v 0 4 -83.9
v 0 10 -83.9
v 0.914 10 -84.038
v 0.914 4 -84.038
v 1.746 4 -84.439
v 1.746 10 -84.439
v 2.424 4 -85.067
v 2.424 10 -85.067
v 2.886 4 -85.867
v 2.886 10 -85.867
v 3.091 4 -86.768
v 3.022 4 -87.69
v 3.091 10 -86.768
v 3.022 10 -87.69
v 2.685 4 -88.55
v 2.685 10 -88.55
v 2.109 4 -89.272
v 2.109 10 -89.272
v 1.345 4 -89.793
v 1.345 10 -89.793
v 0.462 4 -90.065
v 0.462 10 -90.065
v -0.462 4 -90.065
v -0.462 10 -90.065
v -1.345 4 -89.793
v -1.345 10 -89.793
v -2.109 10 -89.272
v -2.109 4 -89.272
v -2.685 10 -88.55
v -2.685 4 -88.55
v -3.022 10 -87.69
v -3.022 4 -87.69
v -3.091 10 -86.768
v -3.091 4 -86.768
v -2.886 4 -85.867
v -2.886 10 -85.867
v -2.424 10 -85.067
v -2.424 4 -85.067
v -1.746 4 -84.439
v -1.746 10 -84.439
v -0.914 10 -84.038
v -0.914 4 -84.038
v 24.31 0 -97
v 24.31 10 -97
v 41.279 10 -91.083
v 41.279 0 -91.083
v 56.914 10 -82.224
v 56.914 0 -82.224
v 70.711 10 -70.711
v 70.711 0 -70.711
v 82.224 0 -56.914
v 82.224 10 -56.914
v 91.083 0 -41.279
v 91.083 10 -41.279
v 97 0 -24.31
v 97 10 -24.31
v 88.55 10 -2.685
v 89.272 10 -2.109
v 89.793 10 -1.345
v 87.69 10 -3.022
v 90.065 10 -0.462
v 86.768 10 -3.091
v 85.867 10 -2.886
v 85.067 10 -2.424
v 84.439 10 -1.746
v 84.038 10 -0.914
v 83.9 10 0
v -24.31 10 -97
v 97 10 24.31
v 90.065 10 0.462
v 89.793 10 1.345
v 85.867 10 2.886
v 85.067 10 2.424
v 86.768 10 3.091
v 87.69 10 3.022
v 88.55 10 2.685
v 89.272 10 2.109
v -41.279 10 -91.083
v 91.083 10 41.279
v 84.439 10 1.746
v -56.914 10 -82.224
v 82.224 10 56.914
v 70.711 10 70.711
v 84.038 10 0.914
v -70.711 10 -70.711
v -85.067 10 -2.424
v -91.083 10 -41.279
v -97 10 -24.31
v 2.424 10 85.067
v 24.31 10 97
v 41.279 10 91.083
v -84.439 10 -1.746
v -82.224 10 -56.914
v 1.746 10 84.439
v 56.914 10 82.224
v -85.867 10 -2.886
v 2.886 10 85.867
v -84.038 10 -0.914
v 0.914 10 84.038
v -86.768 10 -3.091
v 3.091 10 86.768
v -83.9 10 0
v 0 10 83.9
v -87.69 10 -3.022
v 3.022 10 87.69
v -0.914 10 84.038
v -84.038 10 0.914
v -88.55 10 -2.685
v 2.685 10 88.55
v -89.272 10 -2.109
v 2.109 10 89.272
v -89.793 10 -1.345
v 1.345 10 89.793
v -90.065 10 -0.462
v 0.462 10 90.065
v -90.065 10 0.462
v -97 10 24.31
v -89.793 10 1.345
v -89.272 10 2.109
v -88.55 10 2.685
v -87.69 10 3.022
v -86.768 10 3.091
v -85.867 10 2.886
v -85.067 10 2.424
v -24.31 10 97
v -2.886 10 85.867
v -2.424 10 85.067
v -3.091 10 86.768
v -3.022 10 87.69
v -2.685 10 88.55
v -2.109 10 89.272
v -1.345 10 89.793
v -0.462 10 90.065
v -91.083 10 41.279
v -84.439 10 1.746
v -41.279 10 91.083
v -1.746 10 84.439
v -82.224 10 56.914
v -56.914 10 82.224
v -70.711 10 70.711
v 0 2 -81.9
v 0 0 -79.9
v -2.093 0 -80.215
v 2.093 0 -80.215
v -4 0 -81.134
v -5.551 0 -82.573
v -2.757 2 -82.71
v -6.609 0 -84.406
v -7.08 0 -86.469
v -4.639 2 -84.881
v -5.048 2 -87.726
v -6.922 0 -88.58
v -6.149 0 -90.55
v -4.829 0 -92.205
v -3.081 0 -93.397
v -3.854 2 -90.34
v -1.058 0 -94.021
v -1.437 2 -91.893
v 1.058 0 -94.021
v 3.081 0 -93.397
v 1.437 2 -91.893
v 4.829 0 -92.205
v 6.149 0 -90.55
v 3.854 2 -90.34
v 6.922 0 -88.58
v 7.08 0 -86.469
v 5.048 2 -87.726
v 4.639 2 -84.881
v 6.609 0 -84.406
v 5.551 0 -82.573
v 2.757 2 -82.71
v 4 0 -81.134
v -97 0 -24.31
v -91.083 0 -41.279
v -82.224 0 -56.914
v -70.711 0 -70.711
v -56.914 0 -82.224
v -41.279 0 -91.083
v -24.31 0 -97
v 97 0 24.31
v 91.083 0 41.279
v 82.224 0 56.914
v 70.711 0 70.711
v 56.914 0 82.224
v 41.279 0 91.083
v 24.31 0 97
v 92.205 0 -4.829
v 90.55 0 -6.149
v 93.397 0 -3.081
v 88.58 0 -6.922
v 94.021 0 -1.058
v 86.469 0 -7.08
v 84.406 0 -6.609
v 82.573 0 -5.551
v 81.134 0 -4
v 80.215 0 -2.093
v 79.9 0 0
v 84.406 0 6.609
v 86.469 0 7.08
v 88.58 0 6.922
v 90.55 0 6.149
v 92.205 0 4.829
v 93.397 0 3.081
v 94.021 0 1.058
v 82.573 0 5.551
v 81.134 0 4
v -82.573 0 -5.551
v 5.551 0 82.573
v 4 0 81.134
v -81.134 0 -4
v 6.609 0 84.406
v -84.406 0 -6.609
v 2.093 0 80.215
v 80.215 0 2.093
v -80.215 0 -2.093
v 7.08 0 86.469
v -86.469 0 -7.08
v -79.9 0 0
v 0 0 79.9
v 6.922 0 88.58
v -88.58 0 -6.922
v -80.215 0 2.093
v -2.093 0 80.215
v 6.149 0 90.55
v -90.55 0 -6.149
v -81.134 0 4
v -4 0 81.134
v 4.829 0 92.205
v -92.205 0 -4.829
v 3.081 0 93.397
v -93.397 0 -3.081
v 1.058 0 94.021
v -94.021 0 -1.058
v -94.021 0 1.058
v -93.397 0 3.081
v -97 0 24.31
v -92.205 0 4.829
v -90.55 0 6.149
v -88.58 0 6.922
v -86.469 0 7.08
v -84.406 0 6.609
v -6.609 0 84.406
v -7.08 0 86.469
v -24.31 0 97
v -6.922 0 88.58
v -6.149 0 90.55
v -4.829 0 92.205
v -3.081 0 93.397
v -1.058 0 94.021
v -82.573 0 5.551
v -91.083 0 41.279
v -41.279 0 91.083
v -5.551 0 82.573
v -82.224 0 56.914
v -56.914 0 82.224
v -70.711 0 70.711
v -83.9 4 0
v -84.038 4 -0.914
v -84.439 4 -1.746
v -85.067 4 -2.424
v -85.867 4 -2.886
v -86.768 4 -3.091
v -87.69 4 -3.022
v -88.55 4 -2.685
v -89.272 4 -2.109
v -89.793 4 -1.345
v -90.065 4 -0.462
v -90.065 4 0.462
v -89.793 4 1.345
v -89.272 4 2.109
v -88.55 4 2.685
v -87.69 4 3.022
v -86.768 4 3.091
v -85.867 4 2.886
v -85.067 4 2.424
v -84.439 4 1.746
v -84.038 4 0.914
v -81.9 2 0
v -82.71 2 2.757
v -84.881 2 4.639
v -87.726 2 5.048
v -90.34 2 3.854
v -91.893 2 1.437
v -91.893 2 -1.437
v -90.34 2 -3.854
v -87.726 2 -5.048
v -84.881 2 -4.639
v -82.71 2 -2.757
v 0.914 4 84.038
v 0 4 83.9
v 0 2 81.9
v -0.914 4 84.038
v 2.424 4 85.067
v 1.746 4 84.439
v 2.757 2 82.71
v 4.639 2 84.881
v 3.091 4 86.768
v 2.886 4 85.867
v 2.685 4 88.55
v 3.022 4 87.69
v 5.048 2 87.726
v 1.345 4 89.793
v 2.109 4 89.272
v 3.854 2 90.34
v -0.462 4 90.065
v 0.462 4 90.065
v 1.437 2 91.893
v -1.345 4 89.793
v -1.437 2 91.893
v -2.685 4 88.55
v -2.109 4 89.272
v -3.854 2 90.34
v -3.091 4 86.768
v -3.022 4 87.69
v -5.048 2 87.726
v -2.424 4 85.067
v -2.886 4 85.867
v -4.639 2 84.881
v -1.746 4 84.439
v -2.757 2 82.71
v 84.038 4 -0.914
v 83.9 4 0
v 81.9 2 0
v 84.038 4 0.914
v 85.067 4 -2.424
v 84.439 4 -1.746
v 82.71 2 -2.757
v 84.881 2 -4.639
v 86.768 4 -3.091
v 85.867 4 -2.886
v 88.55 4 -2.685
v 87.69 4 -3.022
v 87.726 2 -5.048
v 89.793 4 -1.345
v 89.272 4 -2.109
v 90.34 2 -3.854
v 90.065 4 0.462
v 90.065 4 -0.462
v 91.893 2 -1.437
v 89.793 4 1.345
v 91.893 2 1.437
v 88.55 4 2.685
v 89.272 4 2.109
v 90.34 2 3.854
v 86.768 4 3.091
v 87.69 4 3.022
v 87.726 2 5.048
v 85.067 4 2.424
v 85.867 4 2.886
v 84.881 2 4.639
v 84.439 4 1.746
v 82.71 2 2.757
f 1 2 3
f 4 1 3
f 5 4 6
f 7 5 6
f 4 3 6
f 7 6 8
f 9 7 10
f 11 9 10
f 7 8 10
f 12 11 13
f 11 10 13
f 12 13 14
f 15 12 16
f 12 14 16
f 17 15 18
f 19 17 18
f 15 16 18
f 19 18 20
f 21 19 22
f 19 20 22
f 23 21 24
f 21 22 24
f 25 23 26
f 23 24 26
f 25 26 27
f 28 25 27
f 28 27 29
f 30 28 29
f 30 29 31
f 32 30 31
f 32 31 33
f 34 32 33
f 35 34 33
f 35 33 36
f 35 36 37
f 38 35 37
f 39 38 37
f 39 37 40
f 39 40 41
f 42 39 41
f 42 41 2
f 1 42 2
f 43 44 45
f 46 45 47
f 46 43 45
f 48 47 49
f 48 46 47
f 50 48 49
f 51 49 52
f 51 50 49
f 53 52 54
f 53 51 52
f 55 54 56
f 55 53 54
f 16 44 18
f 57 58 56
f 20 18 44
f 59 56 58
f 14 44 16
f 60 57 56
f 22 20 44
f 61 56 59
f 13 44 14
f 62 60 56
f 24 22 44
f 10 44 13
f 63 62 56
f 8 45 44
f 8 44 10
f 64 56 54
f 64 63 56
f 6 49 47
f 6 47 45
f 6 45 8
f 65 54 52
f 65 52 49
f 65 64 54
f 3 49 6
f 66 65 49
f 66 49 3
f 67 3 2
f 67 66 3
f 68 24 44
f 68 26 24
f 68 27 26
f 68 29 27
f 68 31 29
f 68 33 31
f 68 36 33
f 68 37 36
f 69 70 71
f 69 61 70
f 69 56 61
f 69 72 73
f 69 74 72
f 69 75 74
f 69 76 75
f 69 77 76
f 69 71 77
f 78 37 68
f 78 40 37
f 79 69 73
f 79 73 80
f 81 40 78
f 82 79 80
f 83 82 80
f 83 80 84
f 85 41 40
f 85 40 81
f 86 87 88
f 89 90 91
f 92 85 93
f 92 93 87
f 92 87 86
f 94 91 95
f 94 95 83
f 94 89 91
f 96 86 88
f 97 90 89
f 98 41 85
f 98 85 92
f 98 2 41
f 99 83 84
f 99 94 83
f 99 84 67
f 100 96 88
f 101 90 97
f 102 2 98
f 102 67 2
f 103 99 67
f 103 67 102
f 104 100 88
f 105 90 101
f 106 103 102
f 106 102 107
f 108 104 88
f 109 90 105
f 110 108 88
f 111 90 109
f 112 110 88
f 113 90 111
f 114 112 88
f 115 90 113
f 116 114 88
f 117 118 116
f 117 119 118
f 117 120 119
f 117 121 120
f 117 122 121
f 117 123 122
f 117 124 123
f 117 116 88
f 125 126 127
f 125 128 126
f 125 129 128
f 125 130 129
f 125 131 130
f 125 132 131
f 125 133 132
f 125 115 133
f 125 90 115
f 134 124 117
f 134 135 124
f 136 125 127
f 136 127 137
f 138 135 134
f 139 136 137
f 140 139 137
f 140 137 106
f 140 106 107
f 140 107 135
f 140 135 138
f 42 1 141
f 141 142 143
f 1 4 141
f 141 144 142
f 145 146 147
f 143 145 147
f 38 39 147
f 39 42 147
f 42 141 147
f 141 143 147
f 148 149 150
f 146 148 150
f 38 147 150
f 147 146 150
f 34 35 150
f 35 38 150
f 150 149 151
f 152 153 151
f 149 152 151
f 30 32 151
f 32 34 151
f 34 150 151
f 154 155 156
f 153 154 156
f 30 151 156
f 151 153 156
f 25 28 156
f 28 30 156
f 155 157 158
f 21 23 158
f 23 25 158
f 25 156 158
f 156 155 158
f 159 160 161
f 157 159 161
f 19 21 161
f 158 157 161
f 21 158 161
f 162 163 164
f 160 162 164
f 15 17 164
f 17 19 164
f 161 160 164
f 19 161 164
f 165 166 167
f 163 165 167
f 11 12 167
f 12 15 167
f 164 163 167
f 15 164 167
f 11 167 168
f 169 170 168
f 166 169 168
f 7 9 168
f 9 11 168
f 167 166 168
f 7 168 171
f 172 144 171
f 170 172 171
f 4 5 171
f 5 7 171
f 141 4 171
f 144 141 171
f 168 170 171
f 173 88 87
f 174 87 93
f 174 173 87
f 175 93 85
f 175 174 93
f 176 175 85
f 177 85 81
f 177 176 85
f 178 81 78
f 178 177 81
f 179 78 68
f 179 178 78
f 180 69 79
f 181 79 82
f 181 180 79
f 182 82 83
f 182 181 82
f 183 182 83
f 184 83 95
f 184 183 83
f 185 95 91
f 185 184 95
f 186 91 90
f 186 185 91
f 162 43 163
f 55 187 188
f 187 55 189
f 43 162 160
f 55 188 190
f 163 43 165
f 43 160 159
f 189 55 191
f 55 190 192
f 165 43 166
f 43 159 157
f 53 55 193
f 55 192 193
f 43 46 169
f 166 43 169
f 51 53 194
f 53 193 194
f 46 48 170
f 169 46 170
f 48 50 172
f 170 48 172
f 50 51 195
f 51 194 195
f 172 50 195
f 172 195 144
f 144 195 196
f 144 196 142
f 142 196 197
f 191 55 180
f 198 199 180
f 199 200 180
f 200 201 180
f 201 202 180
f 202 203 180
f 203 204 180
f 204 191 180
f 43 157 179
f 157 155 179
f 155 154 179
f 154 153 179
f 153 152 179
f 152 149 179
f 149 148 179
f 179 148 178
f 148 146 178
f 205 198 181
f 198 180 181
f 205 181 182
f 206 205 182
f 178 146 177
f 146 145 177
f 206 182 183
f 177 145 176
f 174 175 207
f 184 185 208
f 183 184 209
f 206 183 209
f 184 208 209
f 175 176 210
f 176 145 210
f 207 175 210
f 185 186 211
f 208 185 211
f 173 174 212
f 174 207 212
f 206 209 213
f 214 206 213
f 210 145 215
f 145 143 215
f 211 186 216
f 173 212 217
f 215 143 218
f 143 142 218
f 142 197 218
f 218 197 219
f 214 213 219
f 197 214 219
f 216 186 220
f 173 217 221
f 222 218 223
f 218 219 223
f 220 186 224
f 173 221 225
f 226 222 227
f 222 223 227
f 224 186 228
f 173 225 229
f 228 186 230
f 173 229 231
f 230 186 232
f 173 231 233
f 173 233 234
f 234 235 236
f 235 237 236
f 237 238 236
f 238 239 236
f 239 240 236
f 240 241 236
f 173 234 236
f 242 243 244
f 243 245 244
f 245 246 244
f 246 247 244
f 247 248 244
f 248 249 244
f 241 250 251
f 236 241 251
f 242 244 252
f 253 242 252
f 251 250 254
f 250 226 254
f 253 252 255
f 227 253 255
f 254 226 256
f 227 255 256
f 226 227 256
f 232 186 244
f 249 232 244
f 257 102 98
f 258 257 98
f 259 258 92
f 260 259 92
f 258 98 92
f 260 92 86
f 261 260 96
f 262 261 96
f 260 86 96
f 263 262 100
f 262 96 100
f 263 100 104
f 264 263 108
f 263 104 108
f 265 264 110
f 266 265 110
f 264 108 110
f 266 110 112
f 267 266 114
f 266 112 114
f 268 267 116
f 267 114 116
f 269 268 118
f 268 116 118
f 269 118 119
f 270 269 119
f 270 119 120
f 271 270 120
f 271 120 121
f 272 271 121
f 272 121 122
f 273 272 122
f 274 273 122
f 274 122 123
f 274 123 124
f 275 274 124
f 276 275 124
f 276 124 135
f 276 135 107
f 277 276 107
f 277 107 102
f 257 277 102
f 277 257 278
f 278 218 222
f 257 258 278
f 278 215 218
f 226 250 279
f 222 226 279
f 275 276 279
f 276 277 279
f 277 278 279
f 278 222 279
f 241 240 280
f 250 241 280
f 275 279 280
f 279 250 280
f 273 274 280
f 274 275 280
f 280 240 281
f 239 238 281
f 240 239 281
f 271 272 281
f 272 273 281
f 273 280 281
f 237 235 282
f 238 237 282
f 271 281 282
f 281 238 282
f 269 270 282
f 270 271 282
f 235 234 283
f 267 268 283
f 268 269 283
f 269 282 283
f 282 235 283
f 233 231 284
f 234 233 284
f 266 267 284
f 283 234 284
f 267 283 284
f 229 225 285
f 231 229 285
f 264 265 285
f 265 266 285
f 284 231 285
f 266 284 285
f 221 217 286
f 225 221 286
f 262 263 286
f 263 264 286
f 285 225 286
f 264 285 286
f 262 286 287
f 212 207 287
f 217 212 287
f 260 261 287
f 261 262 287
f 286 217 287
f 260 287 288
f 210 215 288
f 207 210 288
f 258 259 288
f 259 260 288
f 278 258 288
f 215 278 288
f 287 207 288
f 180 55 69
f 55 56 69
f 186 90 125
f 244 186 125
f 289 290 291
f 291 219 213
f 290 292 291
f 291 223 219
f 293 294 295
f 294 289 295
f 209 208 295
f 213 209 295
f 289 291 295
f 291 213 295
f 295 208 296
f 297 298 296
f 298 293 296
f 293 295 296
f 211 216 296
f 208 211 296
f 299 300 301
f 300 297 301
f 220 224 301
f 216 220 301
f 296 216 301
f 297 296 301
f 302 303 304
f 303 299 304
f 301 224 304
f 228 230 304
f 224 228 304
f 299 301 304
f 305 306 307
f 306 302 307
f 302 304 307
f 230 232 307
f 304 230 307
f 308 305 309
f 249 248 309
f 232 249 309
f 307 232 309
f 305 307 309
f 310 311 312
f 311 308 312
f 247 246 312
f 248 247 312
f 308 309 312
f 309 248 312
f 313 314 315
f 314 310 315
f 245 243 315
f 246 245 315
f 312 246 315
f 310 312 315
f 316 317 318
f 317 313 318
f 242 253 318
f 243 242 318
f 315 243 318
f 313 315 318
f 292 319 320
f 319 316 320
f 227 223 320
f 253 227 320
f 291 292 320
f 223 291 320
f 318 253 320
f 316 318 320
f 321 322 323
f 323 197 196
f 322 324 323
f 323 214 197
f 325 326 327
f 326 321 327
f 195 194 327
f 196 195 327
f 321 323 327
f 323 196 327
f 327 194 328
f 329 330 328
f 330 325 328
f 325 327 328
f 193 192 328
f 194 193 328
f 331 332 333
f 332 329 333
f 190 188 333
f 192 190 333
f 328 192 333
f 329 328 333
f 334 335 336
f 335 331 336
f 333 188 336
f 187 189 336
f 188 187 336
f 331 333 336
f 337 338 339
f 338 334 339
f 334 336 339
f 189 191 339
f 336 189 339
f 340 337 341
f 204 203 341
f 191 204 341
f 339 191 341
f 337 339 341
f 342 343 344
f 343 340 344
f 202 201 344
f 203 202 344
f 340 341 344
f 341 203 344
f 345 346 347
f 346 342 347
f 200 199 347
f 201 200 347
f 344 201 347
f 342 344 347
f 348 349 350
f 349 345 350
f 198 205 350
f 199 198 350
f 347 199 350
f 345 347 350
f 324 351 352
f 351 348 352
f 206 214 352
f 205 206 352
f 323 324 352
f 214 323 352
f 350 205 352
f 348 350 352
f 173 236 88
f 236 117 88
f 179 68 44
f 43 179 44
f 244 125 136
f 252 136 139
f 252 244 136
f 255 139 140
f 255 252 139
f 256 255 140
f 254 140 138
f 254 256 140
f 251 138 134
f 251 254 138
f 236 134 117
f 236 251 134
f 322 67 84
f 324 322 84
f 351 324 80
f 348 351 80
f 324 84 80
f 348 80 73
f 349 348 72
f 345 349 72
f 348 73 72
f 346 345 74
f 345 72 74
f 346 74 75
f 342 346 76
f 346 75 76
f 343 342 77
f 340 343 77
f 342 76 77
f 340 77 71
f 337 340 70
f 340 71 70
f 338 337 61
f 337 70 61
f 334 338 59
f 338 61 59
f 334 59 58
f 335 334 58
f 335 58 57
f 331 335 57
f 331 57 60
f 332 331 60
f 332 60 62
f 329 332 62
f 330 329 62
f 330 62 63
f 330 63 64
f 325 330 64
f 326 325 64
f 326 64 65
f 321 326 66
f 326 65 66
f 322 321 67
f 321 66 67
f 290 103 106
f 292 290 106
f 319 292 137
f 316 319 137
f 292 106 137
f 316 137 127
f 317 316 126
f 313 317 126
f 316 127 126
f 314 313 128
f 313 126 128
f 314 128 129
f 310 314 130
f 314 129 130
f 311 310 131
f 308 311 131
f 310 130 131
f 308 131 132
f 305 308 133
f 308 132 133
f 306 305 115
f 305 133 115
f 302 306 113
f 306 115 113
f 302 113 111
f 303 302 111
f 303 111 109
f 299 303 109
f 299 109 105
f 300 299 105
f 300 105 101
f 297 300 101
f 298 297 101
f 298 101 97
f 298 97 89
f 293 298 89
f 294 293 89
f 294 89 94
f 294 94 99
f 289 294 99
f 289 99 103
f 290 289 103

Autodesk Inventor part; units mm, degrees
ref_plane "YZ Plane" through (0, 0, 0) normal (1, 0, 0) x (0, 1, 0)
ref_plane "XZ Plane" through (0, 0, 0) normal (0, 1, 0) x (-1, 0, 0)
ref_plane "XY Plane" through (0, 0, 0) normal (0, 0, 1) x (1, 0, 0)
sketch "Skizze1" plane through (0, 0, 0) normal (0, 1, 0) x (-1, 0, 0)
  circle A0 centre (0, 0) radius 100
  dimension "d0" = 200
extrude "Extrusion1" add sketch "Skizze1" along normal blind 10
sketch "Skizze2" plane through (0, 10, 0) normal (0, 1, 0) x (1, 0, 0)
  circle A0 centre (0, 0) radius 100 projected
  circle A1 centre (-87, 0) radius 3.1
  dimension "d3" = 6.2
  dimension "d4" = 87
  dimension "d5" = 200
extrude "Extrusion2" cut sketch "Skizze2" against normal through all contours A1
chamfer "Fasen1" distance 4 angle 45 1 edges at (-90.1, 0, 0)
sketch "Skizze3" plane through (0, 10, 0) normal (0, 1, 0) x (1, 0, 0)
  circle A0 centre (-87, 0) radius 3.1 projected
  circle A1 centre (0, 0) radius 100 projected
  line L0 (-97, -24.3105) -> (-97, 24.3105)
  circle A2 centre (0, 0) radius 100 projected
  point P0 (-97, -24.3105)
  dimension "d11" = 10
extrude "Extrusion3" cut sketch "Skizze3" against normal through all contours L0 A1 picked at (-97.7491, 4.0825)
pattern_circular "Runde Anordnung3" count 4 over 360 about axis through (0, -10, 0) along (0, 1, 0) of "Extrusion2", "Fasen1"
pattern_circular "Runde Anordnung4" count 4 over 360 about axis through (0, -10, 0) along (0, 1, 0) of "Extrusion3"
properties part number "plate_lower"
